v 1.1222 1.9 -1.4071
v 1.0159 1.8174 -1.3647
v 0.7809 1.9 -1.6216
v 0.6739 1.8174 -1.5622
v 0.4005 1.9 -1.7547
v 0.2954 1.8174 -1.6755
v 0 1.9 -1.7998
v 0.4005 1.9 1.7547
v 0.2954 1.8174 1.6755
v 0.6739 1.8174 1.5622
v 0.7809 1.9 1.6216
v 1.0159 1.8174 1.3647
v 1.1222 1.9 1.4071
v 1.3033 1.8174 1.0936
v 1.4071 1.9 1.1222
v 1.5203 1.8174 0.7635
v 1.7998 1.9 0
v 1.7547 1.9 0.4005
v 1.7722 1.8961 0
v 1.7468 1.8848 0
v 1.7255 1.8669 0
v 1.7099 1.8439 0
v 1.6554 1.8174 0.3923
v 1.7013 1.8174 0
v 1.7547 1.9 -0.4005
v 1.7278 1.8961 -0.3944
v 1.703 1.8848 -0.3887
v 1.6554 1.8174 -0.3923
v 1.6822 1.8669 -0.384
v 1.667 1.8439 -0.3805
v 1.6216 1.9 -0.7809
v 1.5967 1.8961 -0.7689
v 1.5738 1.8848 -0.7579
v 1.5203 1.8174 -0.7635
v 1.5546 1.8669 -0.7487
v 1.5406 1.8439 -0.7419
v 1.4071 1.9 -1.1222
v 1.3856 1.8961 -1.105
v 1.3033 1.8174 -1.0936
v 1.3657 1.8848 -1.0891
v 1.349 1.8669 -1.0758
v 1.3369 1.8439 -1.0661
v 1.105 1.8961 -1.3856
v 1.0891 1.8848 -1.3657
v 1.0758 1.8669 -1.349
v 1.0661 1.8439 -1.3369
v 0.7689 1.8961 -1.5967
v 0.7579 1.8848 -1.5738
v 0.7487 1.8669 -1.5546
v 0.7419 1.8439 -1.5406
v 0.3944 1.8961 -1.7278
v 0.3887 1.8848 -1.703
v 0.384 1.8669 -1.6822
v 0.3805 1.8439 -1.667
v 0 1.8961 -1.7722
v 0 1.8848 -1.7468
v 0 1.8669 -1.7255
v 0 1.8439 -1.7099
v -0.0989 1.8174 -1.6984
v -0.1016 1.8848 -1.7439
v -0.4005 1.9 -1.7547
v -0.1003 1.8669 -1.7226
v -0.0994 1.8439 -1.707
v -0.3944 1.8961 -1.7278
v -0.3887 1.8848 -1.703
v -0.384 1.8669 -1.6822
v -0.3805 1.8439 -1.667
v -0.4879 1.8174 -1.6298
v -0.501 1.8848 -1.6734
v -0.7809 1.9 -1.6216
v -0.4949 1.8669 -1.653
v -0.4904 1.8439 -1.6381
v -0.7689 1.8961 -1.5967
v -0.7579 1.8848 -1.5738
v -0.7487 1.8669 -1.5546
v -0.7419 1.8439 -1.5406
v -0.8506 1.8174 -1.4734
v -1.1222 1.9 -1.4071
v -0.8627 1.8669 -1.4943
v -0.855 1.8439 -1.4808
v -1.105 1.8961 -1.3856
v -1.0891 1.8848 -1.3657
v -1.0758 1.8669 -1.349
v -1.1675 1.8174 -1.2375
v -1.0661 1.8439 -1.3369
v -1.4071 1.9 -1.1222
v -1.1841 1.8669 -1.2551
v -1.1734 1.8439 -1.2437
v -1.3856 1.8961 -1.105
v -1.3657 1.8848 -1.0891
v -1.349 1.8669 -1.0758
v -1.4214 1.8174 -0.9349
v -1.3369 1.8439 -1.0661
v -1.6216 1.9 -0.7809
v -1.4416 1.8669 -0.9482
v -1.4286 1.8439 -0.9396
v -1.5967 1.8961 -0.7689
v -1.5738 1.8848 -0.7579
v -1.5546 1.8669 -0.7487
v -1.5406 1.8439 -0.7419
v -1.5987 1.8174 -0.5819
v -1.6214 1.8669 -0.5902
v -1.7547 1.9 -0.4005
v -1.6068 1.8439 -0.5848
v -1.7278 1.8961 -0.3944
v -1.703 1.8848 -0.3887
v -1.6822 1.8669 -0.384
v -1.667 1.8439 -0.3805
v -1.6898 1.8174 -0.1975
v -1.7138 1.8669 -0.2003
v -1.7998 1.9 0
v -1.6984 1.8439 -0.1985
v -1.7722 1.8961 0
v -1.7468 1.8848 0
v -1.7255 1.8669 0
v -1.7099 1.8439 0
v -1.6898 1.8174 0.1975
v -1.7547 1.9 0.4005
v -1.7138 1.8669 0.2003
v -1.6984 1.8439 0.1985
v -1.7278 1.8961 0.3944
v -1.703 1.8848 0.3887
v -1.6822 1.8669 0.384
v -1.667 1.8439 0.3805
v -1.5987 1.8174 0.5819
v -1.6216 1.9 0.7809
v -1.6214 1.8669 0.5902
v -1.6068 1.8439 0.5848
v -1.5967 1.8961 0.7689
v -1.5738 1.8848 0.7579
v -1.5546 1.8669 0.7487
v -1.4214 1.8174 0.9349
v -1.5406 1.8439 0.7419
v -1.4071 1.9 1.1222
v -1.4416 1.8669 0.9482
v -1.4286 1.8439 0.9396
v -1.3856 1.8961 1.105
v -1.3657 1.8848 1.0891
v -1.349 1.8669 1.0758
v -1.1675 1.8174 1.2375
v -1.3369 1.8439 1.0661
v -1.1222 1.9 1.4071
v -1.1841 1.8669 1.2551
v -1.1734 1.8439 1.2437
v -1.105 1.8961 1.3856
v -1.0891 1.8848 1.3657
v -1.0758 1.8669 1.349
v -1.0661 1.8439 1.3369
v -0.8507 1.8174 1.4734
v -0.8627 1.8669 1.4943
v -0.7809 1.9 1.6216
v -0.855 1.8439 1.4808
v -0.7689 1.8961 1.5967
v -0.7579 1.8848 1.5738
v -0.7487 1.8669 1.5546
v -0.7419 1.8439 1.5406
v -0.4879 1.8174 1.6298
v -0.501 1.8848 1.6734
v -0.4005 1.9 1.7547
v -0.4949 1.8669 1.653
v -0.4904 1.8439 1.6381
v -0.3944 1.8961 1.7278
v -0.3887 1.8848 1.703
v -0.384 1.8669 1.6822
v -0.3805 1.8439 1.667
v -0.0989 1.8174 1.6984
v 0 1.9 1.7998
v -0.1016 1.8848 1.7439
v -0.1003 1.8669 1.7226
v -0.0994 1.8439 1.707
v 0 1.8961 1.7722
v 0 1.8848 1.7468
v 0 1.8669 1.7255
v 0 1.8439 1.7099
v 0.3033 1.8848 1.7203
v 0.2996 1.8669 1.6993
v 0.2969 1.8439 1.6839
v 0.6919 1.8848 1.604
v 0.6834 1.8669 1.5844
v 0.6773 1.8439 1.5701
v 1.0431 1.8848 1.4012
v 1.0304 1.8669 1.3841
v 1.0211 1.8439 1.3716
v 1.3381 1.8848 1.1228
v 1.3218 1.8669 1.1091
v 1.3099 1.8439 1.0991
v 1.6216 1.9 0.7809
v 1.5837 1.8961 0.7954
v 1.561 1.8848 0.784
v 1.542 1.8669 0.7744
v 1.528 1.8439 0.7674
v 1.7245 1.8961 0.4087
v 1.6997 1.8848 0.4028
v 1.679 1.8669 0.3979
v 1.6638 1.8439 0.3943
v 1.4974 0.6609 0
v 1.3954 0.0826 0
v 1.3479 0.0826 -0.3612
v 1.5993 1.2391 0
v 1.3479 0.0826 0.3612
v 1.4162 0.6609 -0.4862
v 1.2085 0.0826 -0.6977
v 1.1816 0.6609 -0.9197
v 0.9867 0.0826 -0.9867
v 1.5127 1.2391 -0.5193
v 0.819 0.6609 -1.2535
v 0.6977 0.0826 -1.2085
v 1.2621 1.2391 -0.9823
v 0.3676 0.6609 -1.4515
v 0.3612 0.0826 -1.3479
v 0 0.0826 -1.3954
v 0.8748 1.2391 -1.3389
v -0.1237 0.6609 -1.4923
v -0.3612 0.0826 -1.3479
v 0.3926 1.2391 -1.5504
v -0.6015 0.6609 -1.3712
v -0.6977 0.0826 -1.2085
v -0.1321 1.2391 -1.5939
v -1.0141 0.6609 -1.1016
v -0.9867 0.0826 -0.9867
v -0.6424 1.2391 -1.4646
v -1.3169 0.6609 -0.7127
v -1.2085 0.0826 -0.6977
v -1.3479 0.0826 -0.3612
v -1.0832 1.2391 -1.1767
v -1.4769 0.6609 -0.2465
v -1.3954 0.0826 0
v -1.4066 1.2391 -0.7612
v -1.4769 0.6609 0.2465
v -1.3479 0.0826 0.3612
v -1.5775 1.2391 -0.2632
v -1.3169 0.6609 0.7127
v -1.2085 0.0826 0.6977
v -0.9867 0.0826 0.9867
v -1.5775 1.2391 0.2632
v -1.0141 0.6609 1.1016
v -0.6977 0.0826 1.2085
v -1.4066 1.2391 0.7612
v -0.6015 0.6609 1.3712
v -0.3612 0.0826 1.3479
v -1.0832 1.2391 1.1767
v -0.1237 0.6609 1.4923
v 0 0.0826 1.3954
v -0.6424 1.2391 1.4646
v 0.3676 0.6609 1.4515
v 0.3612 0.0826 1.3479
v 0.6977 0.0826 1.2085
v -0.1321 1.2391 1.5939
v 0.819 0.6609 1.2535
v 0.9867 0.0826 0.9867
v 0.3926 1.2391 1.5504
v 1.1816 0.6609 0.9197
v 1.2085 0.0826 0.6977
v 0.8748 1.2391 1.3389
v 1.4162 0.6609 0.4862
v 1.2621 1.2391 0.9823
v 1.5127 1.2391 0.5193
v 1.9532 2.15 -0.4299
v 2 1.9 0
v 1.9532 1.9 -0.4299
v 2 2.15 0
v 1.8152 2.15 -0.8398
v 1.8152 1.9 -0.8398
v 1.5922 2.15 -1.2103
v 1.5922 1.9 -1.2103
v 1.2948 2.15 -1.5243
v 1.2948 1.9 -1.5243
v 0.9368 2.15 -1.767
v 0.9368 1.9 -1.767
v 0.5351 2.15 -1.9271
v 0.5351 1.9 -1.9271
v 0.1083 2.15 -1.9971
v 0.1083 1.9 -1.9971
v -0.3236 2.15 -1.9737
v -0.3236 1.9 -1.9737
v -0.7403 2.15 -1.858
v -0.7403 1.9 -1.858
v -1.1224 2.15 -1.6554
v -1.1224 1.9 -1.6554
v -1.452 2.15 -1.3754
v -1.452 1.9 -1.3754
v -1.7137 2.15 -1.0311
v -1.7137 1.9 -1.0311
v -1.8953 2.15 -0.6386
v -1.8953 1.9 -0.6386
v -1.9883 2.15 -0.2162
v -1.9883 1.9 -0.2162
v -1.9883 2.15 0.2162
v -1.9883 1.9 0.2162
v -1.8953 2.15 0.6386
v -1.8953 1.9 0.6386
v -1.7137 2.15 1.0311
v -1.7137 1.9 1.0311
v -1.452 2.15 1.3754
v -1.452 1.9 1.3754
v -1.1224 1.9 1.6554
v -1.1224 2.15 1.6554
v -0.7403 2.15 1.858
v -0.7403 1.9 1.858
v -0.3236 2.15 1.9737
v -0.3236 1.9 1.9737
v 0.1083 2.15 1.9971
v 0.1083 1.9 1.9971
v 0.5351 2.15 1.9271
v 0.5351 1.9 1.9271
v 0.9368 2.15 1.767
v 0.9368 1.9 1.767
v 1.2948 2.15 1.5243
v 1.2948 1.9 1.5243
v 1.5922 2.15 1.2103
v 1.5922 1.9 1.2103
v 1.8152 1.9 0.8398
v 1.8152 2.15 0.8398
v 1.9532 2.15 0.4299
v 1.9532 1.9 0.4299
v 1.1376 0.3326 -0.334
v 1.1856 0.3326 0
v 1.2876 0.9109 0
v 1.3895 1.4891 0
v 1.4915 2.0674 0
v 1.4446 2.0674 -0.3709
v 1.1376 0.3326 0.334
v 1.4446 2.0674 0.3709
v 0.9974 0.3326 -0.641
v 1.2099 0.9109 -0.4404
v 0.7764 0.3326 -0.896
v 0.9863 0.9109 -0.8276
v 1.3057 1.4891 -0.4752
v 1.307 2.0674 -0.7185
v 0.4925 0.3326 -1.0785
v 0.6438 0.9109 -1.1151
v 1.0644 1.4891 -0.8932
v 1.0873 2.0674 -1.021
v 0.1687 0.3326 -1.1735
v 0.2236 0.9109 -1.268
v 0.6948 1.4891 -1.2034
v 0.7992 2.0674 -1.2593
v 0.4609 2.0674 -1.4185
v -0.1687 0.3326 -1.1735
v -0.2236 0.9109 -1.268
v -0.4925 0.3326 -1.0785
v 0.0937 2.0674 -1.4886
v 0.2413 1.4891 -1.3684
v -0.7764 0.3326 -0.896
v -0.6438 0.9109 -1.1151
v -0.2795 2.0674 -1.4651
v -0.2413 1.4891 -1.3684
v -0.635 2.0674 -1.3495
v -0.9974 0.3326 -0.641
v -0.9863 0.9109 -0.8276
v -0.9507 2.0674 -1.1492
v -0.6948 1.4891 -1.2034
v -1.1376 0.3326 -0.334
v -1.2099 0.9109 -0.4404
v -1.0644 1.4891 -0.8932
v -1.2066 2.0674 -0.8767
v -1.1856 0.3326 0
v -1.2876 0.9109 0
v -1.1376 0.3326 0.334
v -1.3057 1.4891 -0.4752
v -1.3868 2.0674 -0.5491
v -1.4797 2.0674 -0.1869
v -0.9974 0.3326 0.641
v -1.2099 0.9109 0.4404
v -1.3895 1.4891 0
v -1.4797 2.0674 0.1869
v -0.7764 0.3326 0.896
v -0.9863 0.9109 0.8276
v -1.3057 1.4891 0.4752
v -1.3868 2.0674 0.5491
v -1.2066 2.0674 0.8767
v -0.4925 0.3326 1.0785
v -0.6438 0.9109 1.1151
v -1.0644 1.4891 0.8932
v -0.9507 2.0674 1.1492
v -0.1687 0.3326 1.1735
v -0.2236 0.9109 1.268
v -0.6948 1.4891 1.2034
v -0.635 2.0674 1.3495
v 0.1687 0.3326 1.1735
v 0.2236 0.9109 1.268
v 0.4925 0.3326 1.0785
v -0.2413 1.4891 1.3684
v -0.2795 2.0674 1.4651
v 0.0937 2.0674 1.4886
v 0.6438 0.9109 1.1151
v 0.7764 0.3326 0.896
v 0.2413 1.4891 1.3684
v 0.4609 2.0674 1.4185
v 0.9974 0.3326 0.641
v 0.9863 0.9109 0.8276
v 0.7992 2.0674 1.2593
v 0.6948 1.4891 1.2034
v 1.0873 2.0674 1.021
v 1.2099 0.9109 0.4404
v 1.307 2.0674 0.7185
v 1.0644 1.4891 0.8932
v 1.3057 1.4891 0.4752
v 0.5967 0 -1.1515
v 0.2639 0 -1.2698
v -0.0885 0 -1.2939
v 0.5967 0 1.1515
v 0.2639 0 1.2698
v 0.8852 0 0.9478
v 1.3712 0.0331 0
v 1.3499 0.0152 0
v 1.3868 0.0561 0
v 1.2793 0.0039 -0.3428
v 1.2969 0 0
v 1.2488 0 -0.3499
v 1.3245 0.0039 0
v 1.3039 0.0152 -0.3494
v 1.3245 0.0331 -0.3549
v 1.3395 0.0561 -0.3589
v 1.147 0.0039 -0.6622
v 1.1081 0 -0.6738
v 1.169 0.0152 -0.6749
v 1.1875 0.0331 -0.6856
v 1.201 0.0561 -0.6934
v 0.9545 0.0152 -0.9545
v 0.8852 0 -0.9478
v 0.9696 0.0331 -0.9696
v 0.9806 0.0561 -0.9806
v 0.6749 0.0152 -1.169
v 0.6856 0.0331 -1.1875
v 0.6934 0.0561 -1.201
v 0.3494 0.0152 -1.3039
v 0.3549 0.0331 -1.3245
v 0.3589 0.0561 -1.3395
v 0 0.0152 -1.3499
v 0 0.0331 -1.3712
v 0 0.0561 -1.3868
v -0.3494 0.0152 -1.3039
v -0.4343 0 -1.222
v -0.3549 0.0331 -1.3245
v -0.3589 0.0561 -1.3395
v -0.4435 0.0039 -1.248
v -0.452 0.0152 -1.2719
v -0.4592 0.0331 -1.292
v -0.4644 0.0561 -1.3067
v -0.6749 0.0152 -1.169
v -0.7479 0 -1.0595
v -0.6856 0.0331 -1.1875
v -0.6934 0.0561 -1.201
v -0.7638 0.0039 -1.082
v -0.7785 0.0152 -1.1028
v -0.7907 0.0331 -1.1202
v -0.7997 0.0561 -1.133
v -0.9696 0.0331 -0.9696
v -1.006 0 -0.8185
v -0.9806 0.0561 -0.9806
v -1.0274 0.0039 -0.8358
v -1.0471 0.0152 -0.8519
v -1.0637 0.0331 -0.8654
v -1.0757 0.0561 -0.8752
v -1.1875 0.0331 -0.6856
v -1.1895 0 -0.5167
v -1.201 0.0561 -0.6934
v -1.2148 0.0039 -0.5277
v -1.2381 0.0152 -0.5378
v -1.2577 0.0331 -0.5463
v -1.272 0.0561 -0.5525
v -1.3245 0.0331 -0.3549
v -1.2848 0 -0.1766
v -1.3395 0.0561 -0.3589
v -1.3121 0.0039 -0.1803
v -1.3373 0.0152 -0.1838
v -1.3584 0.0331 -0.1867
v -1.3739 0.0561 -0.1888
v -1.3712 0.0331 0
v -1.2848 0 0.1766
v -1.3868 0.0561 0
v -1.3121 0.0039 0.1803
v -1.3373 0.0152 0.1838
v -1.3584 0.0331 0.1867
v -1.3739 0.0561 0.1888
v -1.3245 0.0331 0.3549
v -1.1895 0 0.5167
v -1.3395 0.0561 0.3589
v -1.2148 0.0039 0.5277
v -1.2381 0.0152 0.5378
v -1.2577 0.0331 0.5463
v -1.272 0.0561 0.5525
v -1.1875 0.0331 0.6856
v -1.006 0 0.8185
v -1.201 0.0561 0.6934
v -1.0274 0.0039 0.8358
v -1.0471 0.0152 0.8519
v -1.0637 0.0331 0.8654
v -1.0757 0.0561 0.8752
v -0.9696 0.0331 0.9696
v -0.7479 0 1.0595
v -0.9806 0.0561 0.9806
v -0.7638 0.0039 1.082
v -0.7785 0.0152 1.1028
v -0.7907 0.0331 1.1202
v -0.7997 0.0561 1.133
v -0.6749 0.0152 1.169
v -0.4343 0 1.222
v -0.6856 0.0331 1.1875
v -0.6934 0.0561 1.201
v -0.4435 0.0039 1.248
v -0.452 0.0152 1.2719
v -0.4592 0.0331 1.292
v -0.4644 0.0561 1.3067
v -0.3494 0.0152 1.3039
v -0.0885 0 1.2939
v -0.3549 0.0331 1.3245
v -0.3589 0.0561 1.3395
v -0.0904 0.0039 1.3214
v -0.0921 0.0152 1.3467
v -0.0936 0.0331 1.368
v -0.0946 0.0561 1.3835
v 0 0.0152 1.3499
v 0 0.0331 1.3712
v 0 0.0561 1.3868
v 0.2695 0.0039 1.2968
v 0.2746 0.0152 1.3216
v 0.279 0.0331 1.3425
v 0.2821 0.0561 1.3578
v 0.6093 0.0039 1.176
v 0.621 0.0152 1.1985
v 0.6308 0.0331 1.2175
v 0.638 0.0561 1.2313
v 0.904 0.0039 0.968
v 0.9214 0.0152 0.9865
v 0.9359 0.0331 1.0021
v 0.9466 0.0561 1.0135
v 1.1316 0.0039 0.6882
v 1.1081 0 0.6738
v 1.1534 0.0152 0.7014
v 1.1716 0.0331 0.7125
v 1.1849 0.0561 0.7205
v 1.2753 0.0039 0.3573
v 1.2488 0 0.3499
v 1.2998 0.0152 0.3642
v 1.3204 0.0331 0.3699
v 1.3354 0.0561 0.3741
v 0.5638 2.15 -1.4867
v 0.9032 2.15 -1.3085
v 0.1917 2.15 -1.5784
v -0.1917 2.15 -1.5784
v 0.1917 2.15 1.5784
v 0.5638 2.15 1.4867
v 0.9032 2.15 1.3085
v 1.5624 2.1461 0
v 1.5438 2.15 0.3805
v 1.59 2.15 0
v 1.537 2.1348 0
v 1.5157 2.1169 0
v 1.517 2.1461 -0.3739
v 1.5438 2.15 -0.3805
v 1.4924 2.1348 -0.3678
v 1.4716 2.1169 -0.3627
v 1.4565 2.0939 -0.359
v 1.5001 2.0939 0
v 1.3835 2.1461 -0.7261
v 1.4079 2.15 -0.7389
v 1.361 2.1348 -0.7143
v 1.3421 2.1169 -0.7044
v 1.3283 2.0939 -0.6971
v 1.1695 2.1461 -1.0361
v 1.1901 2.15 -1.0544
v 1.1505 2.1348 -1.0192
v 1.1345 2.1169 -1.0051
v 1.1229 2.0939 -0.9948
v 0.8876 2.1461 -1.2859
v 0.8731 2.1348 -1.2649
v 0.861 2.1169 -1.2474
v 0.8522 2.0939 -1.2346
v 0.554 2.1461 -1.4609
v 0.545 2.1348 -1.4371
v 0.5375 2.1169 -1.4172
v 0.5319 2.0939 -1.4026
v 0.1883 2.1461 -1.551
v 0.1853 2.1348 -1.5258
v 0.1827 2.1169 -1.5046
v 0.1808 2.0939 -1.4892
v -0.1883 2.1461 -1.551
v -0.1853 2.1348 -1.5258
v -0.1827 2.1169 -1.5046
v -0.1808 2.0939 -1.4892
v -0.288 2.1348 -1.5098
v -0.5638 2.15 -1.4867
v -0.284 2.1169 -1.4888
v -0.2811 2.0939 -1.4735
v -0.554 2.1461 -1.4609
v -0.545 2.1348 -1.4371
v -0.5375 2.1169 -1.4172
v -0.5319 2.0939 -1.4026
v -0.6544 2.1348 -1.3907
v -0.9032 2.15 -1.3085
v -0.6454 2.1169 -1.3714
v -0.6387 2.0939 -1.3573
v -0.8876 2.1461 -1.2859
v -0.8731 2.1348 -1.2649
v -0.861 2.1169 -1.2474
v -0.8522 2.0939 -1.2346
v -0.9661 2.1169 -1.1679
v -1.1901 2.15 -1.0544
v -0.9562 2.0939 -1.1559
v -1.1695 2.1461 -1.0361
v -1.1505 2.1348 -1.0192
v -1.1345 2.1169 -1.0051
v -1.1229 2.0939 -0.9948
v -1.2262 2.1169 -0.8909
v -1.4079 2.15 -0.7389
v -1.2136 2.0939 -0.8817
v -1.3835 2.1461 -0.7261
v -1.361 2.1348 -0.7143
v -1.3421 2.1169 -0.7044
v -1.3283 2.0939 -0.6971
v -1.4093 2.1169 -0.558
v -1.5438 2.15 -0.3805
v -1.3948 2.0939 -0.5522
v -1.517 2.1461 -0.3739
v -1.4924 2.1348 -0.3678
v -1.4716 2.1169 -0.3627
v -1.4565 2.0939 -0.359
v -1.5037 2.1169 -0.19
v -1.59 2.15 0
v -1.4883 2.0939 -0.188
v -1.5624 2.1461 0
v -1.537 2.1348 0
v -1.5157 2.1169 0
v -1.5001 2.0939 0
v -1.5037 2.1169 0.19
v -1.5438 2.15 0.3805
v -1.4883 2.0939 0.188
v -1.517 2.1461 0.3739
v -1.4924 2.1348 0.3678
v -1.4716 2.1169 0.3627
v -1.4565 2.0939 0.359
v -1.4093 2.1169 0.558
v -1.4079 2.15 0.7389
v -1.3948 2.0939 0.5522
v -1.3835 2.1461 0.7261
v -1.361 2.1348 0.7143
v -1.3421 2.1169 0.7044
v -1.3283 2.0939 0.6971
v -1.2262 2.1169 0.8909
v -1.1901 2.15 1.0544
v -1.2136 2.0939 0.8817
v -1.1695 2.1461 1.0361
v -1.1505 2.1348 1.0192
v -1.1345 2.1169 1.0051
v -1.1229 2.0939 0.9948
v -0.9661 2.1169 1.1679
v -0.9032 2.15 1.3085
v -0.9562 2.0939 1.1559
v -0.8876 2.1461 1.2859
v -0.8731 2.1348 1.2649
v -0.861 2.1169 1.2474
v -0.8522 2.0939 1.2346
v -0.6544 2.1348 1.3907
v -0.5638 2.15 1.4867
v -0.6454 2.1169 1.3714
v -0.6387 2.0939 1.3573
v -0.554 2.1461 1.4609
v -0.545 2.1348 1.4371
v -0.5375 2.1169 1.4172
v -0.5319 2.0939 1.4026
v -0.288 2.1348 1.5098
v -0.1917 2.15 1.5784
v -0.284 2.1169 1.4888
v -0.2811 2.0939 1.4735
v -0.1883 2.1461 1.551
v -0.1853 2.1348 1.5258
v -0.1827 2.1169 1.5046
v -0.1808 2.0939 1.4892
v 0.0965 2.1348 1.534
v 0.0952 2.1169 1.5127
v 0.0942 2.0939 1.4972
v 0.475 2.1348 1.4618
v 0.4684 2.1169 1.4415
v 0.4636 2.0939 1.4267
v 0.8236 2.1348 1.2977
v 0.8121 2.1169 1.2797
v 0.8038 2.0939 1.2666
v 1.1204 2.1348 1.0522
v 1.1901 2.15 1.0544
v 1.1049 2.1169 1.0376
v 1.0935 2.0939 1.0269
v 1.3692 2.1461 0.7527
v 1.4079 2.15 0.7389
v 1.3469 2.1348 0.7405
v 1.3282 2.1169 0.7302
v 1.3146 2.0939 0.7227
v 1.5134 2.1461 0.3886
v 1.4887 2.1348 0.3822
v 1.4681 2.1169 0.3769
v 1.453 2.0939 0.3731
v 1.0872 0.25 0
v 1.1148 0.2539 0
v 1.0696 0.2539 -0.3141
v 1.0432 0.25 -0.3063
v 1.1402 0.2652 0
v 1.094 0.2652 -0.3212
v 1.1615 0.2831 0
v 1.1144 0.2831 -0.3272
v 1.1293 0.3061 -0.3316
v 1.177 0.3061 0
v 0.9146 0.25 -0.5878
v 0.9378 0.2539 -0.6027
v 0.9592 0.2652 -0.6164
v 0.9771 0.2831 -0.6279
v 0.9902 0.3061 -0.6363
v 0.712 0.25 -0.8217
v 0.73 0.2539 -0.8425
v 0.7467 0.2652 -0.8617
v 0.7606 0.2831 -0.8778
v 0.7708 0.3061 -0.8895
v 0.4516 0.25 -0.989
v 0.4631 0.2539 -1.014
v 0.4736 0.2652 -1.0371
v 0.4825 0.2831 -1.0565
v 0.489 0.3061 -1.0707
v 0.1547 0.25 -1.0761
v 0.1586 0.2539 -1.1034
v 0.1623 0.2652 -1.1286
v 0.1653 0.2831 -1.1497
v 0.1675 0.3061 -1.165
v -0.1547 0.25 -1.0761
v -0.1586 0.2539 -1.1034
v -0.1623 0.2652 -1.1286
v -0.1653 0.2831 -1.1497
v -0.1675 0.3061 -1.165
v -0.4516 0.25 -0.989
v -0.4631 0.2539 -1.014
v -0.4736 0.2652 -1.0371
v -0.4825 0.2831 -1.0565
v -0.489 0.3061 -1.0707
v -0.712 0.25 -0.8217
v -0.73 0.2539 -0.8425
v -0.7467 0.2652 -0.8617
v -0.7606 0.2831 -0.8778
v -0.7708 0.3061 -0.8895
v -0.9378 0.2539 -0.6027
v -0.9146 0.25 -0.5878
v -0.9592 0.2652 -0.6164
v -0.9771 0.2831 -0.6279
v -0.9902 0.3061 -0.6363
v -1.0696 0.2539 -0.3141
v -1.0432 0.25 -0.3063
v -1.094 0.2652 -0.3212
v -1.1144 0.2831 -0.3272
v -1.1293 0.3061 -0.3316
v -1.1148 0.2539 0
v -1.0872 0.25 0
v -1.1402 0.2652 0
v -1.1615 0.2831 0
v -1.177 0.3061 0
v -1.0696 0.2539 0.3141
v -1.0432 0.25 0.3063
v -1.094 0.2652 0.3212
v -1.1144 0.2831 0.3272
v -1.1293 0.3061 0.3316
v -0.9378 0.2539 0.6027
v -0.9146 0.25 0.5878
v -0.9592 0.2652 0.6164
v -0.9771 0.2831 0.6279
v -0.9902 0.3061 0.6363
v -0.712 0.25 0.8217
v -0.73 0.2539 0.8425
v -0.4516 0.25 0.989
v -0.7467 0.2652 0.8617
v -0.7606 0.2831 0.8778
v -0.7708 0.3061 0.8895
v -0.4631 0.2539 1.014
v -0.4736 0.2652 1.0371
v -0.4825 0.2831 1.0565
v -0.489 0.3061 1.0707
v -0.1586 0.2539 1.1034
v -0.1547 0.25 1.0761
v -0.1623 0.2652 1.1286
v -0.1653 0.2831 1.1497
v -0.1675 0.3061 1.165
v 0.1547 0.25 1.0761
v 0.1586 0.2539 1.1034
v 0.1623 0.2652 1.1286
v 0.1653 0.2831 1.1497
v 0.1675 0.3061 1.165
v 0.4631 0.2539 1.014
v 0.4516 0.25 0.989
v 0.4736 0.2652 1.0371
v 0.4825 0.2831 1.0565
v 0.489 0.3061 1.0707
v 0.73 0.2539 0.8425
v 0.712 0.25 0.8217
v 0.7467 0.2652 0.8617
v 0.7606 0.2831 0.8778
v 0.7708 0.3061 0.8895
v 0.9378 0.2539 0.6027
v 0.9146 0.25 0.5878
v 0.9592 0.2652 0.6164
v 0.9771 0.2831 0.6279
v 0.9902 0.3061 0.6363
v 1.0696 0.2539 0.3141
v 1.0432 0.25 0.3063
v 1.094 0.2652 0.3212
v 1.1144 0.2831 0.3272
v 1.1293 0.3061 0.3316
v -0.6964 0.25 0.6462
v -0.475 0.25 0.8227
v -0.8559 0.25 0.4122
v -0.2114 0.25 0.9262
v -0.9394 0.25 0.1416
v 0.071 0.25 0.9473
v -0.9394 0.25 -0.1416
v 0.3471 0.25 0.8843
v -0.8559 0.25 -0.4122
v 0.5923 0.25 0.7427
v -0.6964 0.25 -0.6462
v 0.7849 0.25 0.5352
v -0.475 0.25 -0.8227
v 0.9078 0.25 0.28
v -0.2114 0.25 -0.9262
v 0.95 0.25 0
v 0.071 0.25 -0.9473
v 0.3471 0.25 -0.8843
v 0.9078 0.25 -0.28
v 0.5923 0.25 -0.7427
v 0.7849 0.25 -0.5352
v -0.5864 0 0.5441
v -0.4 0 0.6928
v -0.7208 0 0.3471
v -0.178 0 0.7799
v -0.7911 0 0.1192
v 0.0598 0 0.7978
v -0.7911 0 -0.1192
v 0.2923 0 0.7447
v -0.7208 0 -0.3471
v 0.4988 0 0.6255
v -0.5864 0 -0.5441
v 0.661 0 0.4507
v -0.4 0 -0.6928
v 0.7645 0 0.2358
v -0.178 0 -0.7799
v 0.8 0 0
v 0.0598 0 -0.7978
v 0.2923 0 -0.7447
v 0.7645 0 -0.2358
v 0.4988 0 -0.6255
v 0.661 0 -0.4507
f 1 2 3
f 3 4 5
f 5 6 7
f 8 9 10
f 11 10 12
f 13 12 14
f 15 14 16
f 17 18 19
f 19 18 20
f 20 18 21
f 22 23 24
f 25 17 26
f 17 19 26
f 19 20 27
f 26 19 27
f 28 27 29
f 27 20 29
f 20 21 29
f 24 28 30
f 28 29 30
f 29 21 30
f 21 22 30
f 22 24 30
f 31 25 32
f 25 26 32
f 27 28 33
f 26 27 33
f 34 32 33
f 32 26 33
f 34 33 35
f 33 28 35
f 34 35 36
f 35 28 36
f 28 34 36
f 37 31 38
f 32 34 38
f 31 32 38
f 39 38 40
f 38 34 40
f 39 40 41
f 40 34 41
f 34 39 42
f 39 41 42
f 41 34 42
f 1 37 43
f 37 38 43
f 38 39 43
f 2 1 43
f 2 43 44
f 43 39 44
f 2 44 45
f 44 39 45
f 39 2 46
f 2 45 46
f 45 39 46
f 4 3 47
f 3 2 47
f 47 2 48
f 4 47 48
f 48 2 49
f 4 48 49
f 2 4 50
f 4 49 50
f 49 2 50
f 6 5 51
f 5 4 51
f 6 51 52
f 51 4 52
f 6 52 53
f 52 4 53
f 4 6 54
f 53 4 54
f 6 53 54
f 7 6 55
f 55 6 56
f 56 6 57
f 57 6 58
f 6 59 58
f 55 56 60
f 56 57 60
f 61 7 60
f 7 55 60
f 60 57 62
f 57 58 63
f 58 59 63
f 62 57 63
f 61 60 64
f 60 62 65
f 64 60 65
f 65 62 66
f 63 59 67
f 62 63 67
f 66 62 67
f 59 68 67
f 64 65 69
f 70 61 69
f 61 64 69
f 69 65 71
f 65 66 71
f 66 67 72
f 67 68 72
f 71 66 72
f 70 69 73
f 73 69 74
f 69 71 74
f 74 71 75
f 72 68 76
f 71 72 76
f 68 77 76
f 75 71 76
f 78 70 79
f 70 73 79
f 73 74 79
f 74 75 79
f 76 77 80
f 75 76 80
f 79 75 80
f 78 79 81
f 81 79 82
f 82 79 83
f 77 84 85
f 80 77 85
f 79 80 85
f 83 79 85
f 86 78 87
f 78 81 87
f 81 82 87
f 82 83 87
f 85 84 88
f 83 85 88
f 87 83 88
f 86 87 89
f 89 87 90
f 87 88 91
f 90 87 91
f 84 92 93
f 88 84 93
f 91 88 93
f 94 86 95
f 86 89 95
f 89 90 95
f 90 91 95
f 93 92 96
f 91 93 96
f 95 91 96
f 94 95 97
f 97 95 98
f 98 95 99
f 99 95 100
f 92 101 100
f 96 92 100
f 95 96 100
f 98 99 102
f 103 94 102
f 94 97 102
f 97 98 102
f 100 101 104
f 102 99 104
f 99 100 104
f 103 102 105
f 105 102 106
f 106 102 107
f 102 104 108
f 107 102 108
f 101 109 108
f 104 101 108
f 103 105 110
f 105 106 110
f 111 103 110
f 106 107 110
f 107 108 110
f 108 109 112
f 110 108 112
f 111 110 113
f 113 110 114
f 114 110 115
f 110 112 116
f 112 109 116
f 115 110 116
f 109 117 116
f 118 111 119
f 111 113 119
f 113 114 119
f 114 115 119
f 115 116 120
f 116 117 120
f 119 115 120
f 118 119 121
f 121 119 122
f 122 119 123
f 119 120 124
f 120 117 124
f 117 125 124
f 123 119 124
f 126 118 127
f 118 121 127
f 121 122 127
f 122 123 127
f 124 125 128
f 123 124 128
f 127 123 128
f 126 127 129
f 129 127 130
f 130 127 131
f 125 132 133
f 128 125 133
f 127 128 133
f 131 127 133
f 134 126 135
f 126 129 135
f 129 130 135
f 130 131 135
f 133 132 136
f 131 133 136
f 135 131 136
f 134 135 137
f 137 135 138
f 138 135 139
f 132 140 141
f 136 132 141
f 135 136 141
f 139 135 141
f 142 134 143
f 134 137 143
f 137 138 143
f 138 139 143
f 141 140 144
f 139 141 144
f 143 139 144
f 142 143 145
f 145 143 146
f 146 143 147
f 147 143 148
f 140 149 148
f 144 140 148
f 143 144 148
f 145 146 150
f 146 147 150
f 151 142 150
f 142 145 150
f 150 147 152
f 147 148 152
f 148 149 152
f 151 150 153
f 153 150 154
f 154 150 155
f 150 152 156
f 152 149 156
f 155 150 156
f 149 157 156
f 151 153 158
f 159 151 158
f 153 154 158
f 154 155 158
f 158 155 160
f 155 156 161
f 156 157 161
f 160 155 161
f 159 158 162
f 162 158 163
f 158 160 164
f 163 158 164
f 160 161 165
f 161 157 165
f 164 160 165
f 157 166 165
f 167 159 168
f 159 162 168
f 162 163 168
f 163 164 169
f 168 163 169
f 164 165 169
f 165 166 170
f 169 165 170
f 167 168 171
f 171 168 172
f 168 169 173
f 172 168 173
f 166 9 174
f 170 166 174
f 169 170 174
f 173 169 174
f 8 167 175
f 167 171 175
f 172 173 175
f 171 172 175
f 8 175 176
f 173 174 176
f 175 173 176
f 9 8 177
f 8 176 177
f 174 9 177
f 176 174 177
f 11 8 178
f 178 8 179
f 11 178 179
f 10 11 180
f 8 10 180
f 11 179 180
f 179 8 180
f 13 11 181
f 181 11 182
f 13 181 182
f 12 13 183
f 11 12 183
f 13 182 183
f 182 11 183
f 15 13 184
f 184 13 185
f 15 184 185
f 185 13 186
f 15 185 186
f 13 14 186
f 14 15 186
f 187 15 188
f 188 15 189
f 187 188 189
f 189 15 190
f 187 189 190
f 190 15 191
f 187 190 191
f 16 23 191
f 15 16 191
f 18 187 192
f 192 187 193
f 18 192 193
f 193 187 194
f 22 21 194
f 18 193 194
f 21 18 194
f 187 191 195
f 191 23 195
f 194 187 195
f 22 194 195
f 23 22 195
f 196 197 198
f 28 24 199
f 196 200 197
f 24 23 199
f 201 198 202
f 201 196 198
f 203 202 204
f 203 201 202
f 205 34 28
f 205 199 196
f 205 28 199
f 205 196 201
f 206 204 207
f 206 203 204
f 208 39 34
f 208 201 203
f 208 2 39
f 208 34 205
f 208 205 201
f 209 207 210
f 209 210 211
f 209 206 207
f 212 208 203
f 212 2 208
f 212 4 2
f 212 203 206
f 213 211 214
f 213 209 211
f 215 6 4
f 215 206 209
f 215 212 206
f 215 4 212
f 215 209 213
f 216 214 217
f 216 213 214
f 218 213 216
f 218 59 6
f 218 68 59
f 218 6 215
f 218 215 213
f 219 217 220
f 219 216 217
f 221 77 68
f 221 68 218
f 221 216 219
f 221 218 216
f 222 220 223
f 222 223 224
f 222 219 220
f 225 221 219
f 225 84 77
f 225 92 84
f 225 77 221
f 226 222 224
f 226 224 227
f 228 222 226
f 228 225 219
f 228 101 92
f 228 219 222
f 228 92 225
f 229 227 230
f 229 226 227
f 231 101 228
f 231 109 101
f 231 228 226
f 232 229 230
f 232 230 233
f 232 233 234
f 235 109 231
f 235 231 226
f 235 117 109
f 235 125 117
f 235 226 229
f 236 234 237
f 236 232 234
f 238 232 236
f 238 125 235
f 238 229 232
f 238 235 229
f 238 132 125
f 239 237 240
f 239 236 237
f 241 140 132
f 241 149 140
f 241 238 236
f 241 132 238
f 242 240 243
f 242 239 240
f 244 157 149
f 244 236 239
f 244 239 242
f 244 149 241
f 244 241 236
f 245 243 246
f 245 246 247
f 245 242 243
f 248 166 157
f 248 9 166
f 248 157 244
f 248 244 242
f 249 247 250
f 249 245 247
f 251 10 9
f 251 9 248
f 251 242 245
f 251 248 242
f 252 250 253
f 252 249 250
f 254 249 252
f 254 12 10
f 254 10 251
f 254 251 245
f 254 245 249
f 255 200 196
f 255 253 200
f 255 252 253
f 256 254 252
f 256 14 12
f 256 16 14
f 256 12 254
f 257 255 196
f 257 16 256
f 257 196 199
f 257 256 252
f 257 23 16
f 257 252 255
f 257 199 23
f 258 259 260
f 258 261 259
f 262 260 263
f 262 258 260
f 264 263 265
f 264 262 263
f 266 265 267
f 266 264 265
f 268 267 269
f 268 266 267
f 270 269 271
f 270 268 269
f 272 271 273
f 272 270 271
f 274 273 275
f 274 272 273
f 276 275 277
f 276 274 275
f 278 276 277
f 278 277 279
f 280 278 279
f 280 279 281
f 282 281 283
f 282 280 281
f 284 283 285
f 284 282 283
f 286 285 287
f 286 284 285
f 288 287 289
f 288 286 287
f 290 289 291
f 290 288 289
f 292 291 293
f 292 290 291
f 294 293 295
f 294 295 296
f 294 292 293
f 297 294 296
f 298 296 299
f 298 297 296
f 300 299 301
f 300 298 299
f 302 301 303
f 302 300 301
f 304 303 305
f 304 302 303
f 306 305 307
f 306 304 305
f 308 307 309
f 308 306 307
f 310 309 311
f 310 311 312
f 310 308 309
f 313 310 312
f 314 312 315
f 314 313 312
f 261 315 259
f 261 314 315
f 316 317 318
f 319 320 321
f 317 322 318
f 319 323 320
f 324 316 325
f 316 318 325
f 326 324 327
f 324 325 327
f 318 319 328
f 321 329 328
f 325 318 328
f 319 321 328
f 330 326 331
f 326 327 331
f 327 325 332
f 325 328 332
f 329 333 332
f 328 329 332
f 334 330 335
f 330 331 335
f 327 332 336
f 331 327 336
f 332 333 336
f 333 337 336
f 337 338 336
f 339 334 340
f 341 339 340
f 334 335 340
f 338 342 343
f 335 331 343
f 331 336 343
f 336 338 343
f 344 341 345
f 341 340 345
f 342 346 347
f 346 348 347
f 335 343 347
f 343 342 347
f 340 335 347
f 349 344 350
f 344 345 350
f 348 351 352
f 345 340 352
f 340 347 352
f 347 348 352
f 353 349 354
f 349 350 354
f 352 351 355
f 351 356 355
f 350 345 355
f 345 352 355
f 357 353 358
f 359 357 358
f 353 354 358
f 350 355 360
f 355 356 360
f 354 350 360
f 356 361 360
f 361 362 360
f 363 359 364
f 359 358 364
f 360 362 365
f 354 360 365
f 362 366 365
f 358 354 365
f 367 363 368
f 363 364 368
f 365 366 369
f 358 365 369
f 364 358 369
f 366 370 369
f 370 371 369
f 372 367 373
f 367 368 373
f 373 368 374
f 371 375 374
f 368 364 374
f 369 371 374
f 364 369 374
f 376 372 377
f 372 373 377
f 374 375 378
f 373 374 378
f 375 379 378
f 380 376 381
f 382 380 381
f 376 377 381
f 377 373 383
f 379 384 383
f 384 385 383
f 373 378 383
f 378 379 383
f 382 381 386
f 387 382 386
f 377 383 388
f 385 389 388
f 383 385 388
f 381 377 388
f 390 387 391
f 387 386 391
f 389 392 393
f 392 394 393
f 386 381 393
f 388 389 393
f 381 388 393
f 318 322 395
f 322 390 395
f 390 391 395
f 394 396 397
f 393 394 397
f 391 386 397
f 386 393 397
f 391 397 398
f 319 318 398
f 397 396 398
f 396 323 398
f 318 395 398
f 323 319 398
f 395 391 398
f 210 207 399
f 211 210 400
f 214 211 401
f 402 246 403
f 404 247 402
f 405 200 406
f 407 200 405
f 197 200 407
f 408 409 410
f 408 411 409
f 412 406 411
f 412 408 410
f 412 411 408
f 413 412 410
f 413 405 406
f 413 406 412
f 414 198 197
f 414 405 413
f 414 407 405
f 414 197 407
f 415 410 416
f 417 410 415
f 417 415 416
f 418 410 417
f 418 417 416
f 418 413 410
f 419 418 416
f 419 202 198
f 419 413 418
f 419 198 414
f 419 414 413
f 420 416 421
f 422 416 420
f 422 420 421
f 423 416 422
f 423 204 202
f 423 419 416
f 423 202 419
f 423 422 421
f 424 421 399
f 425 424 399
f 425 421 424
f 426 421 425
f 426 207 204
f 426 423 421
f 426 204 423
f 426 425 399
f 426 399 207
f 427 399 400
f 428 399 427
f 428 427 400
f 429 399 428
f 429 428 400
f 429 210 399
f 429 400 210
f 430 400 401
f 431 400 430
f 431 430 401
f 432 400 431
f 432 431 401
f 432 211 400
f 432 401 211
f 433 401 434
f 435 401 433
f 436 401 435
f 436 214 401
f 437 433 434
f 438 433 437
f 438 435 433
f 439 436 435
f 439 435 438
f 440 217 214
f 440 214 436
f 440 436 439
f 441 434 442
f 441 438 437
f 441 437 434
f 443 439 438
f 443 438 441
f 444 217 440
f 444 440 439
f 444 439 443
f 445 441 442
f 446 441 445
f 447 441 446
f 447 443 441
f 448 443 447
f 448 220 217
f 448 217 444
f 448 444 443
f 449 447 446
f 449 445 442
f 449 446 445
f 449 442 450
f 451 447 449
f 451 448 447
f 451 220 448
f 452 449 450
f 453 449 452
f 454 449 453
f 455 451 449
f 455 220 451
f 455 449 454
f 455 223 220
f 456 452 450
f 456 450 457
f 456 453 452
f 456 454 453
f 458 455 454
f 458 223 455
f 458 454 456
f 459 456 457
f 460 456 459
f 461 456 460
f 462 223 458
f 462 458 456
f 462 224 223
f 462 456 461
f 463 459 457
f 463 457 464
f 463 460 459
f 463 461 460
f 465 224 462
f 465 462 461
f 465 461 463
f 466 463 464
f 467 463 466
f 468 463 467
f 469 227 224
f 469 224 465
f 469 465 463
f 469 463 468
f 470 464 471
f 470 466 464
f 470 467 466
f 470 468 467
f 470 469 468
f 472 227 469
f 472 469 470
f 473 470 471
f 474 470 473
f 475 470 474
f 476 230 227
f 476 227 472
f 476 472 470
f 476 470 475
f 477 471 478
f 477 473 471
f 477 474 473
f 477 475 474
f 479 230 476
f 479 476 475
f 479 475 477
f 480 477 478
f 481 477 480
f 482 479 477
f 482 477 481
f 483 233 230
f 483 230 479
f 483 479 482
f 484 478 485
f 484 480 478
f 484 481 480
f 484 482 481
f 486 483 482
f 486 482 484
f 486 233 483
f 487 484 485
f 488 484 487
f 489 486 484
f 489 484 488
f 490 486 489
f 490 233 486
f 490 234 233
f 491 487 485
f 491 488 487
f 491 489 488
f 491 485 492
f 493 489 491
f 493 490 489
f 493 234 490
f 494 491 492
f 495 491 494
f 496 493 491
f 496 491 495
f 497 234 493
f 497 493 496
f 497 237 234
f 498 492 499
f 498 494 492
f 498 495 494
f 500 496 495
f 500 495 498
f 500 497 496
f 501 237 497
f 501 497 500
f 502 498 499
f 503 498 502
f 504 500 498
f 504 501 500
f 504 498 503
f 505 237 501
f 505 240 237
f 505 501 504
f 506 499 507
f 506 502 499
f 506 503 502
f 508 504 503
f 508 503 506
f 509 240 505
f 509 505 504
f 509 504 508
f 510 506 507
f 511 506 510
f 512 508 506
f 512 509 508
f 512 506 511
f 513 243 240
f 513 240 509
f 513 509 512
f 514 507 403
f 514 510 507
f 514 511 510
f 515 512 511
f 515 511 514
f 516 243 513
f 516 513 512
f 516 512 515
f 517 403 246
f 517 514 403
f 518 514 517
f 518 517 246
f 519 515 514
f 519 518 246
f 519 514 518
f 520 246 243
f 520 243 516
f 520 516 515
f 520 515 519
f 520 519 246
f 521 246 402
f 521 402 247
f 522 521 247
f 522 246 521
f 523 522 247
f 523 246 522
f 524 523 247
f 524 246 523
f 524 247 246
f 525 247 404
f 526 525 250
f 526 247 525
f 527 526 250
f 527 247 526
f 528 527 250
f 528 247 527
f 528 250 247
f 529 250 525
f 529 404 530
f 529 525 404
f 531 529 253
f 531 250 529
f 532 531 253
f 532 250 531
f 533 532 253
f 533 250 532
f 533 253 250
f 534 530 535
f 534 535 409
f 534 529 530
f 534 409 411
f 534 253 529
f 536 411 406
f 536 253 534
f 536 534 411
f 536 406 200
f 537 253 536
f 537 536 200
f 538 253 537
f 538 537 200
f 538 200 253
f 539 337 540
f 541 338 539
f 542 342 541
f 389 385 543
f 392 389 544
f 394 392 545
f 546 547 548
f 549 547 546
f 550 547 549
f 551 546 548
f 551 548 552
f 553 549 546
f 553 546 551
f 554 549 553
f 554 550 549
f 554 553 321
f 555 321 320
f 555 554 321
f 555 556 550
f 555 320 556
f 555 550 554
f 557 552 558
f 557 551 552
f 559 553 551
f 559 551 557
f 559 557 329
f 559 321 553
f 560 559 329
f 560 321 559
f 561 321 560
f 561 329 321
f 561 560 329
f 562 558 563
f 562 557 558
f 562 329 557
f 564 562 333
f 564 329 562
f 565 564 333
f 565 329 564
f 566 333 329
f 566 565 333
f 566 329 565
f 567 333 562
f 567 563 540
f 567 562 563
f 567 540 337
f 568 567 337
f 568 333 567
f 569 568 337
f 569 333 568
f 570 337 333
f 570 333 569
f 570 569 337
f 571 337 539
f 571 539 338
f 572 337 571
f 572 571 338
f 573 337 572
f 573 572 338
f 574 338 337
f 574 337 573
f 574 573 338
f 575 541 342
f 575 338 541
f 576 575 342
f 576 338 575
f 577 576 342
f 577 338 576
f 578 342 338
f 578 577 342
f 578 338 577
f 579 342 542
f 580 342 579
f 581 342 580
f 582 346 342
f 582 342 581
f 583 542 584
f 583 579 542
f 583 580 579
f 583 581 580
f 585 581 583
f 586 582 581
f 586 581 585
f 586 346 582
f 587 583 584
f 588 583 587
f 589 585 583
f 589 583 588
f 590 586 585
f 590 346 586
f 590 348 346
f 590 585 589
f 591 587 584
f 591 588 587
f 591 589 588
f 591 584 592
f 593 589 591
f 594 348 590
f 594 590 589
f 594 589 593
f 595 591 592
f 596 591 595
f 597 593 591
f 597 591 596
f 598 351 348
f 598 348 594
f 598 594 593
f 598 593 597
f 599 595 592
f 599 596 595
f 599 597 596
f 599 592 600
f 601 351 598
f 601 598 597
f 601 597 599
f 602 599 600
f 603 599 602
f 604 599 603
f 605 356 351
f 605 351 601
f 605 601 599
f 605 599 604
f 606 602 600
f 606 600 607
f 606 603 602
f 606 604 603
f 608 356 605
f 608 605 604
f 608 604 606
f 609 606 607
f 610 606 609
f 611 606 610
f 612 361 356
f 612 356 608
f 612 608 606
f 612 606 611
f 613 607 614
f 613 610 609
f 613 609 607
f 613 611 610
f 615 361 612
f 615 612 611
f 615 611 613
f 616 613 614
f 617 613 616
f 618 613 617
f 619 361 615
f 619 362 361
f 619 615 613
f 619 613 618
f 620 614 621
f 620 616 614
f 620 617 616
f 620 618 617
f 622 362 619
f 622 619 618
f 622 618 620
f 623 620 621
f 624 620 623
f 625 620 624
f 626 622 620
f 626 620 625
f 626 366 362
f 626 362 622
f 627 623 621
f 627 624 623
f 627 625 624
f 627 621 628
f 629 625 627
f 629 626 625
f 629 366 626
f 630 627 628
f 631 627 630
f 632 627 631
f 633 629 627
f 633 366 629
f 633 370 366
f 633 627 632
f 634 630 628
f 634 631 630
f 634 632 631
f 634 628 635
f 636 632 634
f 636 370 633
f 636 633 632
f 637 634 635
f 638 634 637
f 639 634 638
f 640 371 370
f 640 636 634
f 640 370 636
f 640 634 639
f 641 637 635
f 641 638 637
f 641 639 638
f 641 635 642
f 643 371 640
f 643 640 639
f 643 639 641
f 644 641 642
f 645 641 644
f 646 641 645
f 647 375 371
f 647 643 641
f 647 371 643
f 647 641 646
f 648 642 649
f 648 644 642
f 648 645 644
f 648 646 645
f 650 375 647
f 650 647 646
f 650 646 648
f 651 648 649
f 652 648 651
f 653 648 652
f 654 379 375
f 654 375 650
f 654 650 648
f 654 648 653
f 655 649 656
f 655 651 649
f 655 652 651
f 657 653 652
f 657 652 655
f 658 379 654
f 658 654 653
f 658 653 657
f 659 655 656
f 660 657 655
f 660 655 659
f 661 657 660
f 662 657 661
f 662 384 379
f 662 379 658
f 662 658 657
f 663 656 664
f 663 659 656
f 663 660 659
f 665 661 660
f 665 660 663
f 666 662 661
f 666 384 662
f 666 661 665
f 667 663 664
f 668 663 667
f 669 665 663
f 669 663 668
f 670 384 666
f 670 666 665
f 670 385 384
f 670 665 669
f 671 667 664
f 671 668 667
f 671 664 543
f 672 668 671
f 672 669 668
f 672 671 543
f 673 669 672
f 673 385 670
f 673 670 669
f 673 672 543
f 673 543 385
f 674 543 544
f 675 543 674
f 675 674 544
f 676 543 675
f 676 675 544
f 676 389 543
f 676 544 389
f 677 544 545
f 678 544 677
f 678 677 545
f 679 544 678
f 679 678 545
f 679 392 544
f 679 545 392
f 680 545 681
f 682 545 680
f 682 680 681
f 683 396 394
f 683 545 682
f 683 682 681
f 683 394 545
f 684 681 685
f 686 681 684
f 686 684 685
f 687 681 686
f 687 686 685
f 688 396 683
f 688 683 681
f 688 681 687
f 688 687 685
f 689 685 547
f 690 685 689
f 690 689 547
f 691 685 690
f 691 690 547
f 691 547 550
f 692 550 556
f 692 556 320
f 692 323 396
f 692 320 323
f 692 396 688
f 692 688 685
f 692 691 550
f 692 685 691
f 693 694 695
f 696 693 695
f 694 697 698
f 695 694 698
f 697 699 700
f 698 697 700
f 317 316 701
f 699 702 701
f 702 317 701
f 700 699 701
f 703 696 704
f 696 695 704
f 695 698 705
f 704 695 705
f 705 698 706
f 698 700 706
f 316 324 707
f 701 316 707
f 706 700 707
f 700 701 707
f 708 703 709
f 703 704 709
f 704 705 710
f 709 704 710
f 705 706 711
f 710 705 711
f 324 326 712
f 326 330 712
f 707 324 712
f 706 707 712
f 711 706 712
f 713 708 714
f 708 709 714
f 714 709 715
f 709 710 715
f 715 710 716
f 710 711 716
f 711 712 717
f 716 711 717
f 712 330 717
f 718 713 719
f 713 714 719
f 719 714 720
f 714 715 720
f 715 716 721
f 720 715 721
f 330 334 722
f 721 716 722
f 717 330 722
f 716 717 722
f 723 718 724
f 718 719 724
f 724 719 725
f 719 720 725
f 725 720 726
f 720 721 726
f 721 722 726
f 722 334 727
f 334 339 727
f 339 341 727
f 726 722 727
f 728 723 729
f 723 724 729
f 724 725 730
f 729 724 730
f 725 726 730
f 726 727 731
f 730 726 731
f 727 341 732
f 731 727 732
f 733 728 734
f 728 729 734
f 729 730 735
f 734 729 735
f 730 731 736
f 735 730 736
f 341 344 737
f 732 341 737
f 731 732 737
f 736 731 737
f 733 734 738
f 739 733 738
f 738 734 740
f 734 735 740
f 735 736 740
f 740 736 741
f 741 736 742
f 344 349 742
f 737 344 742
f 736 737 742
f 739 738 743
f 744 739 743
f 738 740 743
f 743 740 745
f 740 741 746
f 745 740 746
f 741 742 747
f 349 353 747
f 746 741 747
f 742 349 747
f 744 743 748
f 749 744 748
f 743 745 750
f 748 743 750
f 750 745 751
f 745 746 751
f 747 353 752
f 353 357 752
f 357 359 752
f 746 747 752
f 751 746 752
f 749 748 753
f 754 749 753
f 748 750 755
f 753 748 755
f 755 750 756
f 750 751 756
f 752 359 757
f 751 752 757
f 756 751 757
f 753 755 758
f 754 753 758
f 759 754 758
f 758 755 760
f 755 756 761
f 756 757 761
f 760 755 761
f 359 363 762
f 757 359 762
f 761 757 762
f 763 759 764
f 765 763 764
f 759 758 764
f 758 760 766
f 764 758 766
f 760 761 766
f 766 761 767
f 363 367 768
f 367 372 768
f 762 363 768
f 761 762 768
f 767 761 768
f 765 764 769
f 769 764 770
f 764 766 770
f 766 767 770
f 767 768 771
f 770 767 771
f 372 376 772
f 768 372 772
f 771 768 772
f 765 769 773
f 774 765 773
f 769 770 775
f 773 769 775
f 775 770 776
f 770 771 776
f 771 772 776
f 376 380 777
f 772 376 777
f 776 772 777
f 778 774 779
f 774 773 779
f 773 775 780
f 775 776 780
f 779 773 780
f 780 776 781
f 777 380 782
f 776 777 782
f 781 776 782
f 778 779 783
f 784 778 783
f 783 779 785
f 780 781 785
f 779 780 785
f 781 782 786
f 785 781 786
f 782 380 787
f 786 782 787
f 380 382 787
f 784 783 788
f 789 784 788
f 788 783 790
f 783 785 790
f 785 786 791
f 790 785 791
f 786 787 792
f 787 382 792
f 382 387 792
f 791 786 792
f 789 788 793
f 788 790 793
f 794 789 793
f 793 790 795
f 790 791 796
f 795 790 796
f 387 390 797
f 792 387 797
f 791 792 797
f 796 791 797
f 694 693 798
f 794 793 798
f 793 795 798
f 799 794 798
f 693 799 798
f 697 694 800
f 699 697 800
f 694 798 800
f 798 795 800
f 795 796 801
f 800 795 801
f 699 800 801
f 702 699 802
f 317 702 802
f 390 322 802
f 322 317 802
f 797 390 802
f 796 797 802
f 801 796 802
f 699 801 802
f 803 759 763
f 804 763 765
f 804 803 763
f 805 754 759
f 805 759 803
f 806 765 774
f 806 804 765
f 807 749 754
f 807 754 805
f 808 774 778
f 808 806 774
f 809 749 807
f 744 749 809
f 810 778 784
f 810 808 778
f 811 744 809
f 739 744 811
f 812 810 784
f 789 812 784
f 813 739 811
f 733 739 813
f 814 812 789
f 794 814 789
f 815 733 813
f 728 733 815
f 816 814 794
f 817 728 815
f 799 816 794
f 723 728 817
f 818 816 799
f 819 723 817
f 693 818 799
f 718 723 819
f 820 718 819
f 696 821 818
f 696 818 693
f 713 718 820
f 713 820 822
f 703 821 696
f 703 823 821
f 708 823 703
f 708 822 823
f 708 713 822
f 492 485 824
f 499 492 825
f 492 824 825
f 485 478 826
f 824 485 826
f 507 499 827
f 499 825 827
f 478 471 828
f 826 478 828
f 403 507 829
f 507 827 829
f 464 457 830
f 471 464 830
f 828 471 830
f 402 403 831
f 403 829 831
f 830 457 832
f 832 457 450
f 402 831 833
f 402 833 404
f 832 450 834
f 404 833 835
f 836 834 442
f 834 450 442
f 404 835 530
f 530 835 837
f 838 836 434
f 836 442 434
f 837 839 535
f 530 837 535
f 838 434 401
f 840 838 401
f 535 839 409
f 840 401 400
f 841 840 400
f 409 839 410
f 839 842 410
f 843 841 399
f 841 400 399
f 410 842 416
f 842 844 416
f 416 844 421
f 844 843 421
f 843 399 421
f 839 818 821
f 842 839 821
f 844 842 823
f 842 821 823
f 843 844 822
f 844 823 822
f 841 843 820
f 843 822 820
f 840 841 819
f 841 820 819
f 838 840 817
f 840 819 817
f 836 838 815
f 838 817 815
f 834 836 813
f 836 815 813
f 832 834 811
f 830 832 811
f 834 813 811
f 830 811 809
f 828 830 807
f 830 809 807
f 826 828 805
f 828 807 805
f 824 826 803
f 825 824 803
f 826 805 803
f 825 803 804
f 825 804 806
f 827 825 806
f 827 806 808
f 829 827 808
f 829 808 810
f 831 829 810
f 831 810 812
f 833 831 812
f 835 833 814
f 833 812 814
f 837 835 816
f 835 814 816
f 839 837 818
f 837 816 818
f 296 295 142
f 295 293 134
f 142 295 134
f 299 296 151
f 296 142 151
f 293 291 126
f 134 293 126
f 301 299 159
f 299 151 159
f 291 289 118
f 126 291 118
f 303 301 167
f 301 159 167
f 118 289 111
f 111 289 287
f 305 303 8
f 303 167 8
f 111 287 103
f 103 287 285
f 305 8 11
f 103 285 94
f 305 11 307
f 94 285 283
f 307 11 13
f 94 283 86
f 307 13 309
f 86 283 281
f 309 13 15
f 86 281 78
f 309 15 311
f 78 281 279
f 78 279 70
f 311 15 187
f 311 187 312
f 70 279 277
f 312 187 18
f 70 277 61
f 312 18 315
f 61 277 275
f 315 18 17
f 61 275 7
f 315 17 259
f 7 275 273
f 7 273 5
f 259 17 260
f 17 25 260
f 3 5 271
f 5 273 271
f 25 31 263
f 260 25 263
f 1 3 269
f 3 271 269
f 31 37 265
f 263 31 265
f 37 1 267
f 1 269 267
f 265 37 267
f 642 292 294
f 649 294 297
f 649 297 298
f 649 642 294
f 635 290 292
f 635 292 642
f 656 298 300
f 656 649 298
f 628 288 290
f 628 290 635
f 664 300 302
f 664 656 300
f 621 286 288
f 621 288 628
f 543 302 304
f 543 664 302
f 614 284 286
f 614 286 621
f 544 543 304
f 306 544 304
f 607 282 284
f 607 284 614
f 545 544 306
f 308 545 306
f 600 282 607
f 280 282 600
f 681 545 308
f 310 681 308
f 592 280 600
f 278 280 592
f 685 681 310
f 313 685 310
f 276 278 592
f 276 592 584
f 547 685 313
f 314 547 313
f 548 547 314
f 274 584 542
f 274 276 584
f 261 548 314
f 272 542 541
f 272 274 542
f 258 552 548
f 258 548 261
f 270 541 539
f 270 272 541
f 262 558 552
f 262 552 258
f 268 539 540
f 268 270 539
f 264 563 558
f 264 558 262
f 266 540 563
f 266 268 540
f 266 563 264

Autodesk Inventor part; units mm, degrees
ref_plane "YZ Plane" through (0, 0, 0) normal (1, 0, 0) x (0, 1, 0)
ref_plane "XZ Plane" through (0, 0, 0) normal (0, 1, 0) x (-1, 0, 0)
ref_plane "XY Plane" through (0, 0, 0) normal (0, 0, 1) x (1, 0, 0)
sketch "Sketch1" plane through (0, 0, 0) normal (0, 0, 1) x (1, 0, 0)
  line L0 (0, 0) -> (0, 2.15)
  line L1 (0.8, 0) -> (1.2969, 0)
  line L2 (1.3954, 0.0826) -> (1.7013, 1.8174)
  line L3 (1.7998, 1.9) -> (2, 1.9)
  line L4 (2, 1.9) -> (2, 2.15)
  line L5 (2, 2.15) -> (1.59, 2.15)
  line L6 (1.4915, 2.0674) -> (1.1856, 0.3326)
  line L7 (1.0872, 0.25) -> (0.95, 0.25)
  line L8 (0.95, 0.25) -> (0.8, 0)
  arc A0 (1.59, 2.15) -> (1.4915, 2.0674) centre (1.59, 2.05) ccw
  arc A1 (1.7998, 1.9) -> (1.7013, 1.8174) centre (1.7998, 1.8) ccw
  arc A2 (1.0872, 0.25) -> (1.1856, 0.3326) centre (1.0872, 0.35) ccw
  arc A3 (1.2969, 0) -> (1.3954, 0.0826) centre (1.2969, 0.1) ccw
  point P0 (1.5061, 2.15)
  dimension "d0" = 1.6
  dimension "d2" = 1.9
  dimension "d3" = 0.25
  dimension "d4" = 2.15
  dimension "d5" = 80
  dimension "d6" = 0.1
  dimension "d8" = 3.18
  dimension "d9" = 4
  dimension "d10" = 0.25
  dimension "d11" = 0.25
  dimension "d12" = 0.1
revolve "Revolution1" add sketch "Sketch1" angle 360 about axis through (0, 0, 0) along (0, 1, 0)
properties part number "PP-08" material "Steel, Mild"
